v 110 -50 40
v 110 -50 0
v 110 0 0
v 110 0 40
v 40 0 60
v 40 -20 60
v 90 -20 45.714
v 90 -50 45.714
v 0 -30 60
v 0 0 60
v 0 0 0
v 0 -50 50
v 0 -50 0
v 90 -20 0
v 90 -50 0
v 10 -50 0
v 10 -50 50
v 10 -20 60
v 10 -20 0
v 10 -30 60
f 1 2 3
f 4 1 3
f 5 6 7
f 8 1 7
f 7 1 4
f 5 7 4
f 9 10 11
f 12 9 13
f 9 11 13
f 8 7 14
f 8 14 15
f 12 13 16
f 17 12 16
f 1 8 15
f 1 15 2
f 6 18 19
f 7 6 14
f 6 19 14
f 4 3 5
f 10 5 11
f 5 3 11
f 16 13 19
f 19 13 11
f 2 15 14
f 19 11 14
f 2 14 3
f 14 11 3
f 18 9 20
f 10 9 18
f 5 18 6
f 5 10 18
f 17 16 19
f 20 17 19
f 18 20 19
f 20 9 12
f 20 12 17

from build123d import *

# Parameters (mm, degrees)
F0_W     = 10
F0_H     = 20
F1_DEPTH = 60
F2_SIZE2 = 20
F2_SIZE  = 70
F3_SIZE2 = 20
F3_SIZE  = 10


with BuildPart() as f1:
    # F0 (on Top) → F1 (new body)
    with BuildSketch(Plane.XY):
        Polygon((40, 0), (0, 0), (0, -30), (10, -30), (10, -20), (40, -20), align=None)
        Polygon((110, 0), (40, 0), (40, -20), (90, -20), (90, -50), (110, -50), align=None)
        with Locations((5, -40)):
            Rectangle(F0_W, F0_H)
    extrude(amount=F1_DEPTH)

    # F2
    f2_edges = [f1.edges().sort_by_distance(p)[0] for p in [
        (110, -25, 60),
    ]]
    f2_side = f1.faces().sort_by_distance((58.870968, -17.258065, 60))[0]
    chamfer(f2_edges, length=F2_SIZE, length2=F2_SIZE2, reference=f2_side)

    # F3
    f3_edges = [f1.edges().sort_by_distance(p)[0] for p in [
        (5, -50, 60),
    ]]
    f3_side = f1.faces().sort_by_distance((5, -50, 30))[0]
    chamfer(f3_edges, length=F3_SIZE, length2=F3_SIZE2, reference=f3_side)


solid = f1.part
